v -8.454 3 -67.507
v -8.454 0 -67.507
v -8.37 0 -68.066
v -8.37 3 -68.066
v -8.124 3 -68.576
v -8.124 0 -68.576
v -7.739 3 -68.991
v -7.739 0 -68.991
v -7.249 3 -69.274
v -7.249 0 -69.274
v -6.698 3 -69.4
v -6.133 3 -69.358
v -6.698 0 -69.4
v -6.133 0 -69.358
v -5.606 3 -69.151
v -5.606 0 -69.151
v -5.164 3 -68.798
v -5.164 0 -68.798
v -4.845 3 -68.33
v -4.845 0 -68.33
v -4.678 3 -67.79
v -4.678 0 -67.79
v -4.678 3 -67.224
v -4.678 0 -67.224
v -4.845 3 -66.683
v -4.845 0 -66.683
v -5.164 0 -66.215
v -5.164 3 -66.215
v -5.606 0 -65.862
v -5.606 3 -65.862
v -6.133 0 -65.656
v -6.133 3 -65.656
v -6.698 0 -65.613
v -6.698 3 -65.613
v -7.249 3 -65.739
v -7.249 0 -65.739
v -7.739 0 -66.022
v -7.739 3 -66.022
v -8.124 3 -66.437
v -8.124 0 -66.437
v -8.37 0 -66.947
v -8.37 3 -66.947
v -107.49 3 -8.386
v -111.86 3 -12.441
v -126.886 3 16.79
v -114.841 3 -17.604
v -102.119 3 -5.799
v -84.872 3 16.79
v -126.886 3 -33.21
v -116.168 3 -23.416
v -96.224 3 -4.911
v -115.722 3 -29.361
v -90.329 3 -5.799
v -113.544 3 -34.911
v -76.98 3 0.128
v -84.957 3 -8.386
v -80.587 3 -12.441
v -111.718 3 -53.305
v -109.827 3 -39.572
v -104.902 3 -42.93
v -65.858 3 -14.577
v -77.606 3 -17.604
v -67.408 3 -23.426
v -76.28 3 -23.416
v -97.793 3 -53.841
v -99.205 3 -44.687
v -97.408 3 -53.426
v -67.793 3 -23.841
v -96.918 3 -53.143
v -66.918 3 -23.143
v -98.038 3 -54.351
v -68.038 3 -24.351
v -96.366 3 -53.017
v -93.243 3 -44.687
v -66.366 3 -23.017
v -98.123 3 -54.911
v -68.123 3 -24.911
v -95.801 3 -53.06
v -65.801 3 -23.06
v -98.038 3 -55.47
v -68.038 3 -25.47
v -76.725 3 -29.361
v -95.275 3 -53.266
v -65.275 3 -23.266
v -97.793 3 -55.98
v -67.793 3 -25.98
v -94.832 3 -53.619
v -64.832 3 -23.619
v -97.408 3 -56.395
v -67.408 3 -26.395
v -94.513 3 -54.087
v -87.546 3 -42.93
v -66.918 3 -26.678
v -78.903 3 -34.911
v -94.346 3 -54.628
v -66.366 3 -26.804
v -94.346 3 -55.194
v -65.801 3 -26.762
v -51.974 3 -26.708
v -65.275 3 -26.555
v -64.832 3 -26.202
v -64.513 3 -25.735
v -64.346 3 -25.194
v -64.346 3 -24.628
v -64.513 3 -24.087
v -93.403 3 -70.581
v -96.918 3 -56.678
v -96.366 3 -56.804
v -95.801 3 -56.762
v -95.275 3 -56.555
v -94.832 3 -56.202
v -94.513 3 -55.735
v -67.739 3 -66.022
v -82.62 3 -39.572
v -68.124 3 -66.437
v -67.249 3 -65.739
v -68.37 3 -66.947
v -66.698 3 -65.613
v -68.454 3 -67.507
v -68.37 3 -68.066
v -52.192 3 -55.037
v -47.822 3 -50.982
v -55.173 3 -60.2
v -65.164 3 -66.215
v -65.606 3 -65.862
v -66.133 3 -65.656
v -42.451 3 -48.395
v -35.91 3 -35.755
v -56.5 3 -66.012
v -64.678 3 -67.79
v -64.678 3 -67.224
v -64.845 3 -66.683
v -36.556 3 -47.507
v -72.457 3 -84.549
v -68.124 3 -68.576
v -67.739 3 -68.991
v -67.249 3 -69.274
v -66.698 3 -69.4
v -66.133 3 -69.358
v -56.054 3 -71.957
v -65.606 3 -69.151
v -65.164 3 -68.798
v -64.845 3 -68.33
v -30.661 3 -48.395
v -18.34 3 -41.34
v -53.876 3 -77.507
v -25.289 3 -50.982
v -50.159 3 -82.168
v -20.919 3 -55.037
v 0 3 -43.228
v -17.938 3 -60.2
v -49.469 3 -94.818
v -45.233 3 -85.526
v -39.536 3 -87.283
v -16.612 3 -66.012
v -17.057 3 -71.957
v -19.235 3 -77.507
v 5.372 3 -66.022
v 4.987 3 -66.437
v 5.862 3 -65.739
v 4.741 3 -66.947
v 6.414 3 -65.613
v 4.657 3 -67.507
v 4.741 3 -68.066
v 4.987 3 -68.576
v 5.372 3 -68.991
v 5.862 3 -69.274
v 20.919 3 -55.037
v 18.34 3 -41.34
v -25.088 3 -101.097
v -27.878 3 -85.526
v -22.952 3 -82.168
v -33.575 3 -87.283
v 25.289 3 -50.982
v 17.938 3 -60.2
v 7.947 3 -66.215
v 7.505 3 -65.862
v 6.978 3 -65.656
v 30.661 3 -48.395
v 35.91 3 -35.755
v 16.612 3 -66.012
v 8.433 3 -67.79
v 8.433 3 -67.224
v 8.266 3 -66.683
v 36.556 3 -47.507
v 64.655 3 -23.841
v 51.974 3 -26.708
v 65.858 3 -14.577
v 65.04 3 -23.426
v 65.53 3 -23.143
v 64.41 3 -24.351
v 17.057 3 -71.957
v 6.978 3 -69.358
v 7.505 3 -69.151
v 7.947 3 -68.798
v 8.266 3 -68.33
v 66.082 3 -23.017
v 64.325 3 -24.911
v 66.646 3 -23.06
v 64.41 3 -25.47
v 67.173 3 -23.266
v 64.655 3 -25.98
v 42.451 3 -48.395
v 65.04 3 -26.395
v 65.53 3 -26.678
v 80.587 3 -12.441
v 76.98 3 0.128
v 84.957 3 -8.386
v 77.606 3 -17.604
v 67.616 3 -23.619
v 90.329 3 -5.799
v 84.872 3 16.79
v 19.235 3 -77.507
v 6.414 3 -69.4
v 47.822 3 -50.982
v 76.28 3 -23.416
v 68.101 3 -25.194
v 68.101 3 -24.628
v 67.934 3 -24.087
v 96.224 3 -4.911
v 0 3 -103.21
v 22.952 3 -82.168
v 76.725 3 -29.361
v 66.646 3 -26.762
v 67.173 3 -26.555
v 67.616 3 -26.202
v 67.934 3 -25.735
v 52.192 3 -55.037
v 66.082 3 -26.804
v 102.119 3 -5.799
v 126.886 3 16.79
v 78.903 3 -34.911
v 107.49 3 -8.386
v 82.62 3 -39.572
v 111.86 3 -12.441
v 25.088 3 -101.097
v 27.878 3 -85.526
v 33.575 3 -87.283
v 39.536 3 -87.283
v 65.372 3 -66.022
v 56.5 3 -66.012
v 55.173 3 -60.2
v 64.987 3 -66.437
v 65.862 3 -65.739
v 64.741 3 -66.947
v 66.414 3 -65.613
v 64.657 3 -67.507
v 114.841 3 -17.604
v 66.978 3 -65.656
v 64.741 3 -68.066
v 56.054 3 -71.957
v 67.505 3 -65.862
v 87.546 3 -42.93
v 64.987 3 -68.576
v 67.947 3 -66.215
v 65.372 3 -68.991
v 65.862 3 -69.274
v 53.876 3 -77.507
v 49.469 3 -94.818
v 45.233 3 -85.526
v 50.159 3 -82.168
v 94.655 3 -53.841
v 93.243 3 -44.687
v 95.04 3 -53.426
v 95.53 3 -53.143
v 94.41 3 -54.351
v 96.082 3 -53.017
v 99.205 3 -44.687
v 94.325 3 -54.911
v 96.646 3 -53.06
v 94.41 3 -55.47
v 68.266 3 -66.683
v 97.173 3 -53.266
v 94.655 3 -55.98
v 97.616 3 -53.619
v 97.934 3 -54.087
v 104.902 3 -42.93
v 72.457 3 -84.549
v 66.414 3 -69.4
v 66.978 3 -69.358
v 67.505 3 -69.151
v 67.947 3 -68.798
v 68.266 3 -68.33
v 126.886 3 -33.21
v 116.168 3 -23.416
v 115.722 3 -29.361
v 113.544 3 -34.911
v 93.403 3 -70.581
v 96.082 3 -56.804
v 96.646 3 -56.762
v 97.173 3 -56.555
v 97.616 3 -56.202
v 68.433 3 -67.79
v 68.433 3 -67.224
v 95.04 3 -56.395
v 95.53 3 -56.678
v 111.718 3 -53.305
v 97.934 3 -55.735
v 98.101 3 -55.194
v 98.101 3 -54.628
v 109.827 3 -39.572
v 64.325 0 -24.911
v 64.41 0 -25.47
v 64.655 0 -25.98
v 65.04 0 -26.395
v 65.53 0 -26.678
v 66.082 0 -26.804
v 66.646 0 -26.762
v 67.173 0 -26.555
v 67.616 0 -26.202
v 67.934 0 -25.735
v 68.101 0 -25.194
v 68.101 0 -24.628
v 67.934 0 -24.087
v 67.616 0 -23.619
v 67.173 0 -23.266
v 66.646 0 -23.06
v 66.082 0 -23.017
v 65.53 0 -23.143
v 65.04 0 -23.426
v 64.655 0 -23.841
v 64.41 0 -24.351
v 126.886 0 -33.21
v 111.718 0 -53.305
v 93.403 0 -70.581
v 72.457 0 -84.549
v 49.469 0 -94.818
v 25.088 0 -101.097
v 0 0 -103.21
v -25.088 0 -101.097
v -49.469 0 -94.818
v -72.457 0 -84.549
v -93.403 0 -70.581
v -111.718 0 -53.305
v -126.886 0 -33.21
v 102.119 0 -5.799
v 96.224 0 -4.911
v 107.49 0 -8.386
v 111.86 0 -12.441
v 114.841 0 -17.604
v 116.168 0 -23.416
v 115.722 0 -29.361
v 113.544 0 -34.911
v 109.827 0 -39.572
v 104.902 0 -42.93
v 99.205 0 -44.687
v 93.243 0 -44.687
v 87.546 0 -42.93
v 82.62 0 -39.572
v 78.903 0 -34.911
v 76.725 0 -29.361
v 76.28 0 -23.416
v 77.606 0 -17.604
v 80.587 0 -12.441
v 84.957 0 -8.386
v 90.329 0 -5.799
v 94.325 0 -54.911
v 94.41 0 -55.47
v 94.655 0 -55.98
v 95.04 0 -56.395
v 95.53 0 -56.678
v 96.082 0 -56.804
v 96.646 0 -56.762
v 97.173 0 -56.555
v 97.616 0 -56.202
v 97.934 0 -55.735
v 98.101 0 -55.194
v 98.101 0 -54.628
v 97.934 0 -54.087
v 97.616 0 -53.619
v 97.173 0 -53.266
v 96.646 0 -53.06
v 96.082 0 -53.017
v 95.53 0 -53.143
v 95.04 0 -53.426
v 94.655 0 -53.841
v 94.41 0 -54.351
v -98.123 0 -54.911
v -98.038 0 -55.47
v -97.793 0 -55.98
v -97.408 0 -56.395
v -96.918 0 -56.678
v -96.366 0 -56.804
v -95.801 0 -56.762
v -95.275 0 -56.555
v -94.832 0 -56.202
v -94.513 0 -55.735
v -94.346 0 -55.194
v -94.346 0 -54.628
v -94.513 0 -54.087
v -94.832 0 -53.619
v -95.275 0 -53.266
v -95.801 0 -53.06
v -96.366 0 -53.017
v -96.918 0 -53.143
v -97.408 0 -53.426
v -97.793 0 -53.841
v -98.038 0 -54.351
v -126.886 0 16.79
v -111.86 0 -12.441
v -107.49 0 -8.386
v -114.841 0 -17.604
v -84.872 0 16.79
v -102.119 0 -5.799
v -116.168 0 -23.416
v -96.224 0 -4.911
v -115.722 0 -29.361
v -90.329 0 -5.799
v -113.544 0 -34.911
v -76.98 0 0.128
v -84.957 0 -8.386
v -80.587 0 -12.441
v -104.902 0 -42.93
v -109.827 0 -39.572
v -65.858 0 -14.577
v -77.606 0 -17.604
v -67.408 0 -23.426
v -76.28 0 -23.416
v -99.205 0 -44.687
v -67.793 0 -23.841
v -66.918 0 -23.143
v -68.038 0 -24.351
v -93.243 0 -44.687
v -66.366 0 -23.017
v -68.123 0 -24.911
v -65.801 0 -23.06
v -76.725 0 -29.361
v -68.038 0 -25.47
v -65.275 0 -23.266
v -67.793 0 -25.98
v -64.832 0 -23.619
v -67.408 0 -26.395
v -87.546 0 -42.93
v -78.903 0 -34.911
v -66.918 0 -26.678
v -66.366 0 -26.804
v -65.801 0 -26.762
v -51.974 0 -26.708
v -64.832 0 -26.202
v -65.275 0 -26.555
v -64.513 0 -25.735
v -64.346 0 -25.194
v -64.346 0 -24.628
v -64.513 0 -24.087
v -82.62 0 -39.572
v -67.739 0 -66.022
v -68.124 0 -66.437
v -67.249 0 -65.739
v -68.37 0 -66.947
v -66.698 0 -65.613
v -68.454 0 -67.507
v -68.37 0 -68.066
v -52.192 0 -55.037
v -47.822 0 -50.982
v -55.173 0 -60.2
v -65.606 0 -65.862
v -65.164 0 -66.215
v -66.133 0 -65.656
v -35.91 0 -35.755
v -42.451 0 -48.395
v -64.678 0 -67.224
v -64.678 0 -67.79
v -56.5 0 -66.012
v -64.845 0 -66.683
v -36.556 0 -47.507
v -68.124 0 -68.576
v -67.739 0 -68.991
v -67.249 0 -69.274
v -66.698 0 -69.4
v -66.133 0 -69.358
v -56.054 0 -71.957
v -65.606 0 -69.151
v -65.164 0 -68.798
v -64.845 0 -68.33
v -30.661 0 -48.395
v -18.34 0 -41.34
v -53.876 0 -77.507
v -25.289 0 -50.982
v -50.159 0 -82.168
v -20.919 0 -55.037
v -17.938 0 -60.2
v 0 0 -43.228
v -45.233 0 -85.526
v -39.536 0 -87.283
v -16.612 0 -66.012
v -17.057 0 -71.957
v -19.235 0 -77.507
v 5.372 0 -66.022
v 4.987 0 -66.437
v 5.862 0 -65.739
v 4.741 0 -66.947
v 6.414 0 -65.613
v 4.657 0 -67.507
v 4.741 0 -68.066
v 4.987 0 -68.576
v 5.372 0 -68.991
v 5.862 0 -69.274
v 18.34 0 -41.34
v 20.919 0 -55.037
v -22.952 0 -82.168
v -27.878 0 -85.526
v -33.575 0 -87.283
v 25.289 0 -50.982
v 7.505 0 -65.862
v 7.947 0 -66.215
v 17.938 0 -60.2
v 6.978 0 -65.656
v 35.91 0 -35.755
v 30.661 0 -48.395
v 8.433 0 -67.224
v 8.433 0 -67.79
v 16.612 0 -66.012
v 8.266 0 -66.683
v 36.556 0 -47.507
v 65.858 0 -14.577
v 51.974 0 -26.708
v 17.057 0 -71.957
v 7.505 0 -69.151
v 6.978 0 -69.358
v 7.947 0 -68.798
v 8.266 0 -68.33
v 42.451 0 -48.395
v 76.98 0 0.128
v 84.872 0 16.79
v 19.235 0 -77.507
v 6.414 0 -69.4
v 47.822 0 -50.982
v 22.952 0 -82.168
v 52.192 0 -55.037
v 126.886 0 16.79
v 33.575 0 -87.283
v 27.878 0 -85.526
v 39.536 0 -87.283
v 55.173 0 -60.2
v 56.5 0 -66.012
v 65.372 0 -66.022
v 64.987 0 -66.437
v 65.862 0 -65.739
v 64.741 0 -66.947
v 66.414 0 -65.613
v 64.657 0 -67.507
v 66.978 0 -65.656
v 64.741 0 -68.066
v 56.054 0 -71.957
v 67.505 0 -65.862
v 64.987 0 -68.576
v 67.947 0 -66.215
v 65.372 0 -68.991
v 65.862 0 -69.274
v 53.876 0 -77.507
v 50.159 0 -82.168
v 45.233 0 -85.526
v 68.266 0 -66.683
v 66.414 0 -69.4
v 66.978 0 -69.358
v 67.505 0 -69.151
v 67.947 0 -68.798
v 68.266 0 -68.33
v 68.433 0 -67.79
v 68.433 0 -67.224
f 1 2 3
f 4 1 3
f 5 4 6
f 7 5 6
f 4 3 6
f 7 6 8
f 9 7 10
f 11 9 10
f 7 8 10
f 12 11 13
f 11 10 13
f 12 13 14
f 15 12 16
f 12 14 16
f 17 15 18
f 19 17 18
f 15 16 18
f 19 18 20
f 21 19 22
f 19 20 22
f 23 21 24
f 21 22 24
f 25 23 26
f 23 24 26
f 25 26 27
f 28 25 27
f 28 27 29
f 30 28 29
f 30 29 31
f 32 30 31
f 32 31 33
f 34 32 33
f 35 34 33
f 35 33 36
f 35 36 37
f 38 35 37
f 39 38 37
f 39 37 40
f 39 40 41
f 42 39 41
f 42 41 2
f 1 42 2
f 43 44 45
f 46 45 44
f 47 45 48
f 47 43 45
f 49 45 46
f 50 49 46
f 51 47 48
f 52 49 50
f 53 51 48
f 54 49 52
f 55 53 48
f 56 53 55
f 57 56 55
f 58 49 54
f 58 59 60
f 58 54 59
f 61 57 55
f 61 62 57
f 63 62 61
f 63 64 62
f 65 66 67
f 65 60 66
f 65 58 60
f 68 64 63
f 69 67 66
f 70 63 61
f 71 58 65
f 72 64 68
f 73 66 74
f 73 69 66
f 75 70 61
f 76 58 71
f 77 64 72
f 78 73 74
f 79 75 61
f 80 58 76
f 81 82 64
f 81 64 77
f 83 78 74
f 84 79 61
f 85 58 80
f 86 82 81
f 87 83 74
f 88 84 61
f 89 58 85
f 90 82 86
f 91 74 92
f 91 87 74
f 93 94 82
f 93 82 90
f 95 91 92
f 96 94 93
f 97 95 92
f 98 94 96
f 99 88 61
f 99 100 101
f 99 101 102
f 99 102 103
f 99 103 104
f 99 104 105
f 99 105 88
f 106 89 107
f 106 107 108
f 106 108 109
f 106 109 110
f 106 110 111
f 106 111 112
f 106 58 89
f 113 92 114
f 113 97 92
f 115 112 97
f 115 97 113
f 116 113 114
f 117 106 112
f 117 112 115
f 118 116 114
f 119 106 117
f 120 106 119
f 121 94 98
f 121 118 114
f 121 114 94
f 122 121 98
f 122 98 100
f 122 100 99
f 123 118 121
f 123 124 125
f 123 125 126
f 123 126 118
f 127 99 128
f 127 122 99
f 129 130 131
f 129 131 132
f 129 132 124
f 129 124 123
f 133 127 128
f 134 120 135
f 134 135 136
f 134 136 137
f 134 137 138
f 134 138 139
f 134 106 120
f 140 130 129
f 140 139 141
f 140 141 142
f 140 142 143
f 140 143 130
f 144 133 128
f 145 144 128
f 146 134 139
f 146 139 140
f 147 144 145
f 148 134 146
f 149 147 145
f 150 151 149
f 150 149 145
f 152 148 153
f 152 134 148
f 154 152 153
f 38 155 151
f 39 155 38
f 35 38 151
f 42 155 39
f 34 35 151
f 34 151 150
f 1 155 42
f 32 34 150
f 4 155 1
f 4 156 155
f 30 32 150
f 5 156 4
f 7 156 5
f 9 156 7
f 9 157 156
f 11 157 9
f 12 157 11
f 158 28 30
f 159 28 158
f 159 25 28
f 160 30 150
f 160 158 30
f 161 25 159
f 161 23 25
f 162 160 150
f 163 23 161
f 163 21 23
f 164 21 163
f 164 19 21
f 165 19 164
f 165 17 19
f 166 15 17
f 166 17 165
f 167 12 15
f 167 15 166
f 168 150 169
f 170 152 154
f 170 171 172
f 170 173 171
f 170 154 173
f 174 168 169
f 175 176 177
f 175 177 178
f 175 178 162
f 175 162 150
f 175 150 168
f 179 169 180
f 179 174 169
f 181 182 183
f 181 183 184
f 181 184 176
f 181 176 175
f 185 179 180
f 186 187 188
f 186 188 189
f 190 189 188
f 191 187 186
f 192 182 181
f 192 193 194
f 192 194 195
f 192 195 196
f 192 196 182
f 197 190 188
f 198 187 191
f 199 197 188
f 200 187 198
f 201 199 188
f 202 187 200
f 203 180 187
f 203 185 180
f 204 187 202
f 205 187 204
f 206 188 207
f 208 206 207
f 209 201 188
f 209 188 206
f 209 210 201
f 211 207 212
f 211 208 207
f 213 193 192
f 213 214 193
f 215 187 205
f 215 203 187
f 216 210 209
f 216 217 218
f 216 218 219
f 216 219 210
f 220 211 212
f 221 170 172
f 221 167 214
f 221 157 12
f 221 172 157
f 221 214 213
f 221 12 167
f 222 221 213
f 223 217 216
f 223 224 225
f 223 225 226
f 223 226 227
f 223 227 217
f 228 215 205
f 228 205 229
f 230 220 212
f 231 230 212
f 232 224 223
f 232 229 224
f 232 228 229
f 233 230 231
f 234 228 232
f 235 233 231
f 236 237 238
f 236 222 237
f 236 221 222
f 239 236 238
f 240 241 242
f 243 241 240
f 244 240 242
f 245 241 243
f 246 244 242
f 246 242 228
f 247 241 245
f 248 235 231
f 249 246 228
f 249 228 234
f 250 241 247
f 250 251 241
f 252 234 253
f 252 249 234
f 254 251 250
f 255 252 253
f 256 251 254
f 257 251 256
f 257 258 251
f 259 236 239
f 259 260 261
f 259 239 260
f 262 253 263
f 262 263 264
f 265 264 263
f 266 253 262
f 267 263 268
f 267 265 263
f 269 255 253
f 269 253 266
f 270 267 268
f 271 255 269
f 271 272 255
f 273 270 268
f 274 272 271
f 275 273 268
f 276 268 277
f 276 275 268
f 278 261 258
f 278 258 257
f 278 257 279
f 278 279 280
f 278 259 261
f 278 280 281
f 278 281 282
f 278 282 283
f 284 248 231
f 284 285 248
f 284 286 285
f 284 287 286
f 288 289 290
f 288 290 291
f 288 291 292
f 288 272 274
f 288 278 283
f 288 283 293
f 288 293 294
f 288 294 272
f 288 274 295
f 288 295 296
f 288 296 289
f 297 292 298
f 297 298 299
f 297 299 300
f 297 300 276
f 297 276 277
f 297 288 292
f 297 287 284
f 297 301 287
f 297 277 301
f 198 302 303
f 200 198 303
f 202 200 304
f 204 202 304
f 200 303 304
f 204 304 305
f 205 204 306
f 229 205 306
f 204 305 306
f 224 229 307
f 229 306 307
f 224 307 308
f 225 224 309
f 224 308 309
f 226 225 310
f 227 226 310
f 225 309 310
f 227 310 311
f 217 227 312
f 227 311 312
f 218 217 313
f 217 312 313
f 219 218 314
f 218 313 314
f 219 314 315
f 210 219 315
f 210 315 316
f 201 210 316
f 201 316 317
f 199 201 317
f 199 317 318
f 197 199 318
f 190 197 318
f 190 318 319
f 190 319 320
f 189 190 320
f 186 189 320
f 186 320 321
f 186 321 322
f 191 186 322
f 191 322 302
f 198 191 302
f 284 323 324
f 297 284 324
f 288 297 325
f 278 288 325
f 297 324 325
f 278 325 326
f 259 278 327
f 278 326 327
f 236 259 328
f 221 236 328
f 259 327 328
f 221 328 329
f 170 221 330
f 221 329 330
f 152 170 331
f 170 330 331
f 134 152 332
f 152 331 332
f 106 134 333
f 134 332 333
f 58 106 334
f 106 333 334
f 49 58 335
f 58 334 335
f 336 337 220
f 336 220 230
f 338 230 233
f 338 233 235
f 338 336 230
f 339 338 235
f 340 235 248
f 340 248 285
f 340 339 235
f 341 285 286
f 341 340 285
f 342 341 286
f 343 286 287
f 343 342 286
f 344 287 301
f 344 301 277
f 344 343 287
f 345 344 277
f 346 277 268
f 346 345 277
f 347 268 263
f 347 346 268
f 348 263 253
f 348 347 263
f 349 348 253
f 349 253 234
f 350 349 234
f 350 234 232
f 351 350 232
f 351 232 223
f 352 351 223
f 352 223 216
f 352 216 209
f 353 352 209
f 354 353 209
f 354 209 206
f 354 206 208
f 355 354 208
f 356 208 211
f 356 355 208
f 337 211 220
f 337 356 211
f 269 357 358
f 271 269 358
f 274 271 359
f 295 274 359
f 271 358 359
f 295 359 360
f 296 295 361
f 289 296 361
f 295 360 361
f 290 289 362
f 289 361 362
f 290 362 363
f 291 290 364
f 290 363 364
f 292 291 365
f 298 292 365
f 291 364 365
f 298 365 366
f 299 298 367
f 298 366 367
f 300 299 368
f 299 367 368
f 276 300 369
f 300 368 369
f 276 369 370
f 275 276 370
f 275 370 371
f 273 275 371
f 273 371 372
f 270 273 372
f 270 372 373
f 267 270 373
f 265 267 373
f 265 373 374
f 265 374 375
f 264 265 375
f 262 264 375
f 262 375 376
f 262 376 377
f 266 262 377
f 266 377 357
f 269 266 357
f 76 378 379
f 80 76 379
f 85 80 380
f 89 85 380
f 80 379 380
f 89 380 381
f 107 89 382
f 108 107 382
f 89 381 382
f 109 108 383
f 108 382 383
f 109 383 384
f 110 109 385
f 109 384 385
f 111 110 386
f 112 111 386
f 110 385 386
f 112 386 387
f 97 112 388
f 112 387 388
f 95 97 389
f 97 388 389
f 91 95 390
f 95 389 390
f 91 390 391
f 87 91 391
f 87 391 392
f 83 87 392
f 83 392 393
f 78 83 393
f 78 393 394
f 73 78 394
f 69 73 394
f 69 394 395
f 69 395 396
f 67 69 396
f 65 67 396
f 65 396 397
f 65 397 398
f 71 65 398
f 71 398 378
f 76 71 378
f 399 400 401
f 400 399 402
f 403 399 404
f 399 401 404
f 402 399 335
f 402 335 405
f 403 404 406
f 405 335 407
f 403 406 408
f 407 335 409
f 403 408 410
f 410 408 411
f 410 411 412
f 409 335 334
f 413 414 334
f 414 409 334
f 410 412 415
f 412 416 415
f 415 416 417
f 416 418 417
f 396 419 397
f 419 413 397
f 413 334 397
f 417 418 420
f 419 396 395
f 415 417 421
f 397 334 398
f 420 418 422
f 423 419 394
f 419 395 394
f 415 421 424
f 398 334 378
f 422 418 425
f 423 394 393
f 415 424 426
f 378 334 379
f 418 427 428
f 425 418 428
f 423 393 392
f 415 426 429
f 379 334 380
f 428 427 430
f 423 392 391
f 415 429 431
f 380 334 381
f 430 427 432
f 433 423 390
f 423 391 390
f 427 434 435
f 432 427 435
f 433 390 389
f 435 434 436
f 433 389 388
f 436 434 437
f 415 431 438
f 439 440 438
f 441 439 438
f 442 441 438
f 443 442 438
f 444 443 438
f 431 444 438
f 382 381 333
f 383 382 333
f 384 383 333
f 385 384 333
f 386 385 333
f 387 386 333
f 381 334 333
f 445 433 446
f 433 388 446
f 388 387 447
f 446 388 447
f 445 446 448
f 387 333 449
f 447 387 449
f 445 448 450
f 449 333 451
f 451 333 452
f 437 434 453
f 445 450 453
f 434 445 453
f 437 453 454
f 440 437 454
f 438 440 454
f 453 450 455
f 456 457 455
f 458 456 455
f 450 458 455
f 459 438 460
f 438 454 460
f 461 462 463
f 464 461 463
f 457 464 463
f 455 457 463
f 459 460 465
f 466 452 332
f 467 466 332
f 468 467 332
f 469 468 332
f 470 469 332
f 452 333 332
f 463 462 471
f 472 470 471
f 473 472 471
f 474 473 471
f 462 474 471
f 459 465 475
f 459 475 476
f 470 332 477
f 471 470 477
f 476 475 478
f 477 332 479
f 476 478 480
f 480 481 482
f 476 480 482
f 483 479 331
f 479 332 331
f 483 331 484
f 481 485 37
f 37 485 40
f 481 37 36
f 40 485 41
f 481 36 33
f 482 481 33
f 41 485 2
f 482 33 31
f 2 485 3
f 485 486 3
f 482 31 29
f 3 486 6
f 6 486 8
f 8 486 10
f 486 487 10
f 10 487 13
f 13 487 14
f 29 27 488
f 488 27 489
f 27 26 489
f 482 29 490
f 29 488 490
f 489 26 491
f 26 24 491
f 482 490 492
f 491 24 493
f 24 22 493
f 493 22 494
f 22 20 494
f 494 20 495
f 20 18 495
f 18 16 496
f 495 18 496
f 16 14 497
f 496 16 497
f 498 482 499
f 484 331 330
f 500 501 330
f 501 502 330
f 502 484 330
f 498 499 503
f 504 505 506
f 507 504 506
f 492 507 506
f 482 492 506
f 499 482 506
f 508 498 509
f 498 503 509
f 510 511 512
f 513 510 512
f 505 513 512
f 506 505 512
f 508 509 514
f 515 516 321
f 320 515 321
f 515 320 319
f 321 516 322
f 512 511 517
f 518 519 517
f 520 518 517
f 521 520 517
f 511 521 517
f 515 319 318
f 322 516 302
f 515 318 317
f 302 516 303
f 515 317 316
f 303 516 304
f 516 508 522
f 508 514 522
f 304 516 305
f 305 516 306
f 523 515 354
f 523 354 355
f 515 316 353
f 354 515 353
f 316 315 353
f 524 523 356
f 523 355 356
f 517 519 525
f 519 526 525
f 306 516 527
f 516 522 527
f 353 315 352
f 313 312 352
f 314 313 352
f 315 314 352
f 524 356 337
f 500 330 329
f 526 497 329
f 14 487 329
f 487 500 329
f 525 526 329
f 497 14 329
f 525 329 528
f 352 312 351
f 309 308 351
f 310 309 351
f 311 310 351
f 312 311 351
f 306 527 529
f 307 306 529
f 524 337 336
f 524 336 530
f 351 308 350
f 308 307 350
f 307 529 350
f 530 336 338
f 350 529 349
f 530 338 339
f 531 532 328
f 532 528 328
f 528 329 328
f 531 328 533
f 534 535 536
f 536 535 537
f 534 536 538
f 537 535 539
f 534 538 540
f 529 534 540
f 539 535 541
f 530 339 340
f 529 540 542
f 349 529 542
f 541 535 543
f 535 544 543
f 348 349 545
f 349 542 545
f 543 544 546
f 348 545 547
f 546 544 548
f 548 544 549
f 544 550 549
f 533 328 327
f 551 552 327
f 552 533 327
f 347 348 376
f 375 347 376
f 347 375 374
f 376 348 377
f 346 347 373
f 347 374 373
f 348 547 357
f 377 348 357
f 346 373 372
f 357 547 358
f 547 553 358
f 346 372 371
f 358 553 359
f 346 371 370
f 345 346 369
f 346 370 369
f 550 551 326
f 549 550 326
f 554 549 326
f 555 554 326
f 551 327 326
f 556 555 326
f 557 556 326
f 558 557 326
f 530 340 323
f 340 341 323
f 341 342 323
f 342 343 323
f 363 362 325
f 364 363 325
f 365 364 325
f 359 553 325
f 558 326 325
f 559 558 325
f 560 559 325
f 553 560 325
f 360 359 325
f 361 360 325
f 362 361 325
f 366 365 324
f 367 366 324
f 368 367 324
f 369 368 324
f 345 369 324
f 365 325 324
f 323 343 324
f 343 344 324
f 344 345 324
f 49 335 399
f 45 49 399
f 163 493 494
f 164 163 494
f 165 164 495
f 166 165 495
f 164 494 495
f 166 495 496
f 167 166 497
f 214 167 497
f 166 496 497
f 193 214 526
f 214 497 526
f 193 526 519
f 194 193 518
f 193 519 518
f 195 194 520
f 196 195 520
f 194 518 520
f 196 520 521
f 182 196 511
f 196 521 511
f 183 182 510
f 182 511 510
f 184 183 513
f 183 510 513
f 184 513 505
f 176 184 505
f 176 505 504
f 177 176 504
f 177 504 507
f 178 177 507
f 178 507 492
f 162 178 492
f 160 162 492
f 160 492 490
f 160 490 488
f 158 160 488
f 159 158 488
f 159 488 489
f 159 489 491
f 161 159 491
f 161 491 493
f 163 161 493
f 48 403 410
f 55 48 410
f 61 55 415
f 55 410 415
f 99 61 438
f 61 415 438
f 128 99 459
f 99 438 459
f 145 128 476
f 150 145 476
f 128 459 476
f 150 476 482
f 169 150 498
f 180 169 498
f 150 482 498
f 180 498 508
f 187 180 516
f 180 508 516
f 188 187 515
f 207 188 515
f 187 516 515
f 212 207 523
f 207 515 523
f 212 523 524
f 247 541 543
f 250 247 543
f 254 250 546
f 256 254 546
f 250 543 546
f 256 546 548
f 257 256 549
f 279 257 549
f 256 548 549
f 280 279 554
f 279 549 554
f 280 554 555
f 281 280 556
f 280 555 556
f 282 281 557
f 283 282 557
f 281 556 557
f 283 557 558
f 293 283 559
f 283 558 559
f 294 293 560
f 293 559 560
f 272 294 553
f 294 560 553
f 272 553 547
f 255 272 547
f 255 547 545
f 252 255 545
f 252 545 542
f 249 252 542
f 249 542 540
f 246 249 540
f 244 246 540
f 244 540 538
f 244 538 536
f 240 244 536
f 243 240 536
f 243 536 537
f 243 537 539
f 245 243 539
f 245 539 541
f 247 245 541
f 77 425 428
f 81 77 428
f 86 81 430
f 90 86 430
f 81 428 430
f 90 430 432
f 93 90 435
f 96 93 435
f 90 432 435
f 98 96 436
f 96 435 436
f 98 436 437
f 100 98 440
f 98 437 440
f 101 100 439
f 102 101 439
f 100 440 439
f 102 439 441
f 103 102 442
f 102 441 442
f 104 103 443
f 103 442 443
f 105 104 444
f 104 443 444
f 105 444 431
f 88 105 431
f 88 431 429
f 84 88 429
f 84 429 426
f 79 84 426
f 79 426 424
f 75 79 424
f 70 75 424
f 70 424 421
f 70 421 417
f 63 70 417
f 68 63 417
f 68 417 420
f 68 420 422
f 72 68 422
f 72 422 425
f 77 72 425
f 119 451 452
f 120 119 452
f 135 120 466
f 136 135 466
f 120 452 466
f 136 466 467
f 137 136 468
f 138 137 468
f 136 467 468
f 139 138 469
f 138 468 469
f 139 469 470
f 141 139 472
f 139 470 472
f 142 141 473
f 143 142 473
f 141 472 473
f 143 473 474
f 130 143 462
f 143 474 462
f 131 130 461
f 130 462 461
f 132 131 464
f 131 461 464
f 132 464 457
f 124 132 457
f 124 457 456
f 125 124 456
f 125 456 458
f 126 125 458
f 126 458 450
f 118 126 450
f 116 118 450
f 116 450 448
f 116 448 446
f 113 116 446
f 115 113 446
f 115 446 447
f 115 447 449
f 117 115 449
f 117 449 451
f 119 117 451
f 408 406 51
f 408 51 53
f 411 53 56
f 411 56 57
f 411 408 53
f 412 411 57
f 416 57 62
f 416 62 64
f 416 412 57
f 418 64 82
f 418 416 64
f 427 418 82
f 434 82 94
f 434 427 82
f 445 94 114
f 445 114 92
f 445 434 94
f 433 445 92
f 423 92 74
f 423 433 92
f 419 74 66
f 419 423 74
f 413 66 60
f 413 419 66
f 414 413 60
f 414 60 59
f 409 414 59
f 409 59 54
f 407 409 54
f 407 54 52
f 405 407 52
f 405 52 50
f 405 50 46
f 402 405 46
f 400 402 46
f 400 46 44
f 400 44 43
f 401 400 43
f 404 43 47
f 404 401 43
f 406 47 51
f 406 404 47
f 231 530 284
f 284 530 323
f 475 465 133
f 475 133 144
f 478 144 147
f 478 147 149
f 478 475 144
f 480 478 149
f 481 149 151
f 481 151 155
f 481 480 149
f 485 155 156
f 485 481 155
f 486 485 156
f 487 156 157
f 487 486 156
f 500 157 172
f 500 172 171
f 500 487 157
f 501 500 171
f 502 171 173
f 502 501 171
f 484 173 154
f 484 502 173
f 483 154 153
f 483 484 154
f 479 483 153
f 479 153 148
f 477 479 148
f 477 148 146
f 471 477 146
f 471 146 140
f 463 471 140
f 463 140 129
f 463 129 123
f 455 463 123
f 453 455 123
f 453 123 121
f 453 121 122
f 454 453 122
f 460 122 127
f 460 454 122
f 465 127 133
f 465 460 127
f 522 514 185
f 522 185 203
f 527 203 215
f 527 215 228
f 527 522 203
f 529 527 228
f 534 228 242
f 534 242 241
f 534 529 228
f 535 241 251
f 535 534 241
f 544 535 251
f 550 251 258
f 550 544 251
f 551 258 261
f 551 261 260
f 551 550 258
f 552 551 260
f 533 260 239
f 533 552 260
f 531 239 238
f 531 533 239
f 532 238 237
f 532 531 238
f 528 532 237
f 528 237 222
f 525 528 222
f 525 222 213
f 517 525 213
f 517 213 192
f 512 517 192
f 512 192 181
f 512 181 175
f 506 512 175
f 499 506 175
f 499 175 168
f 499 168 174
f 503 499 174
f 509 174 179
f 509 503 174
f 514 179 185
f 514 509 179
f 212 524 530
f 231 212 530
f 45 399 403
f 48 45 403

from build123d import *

# Parameters (mm, degrees)
SKETCH3_R              = 20
BOSS_EXTRUDE3_DEPTH    = 3
F_10_24_TAPPED_HOLE1_D = 3.7973


with BuildPart() as part:
    # Sketch3 → Boss-Extrude3 (new body)
    with BuildSketch(Plane(origin=(0, 0, 0), x_dir=(1, 0, 0), z_dir=(0, 1, 0))):
        with BuildLine():
            Line((-126.885775404, -16.789832489), (-84.87168845, -16.789832489))
            ThreePointArc((-84.87168845, -16.789832489), (0, 43.227962976), (84.87168845, -16.789832489))
            Line((84.87168845, -16.789832489), (126.885775404, -16.789832489))
            Line((126.885775404, -16.789832489), (126.885775404, 33.210167511))
            ThreePointArc((126.885775404, 33.210167511), (0, 103.210167511), (-126.885775404, 33.210167511))
            Line((-126.885775404, 33.210167511), (-126.885775404, -16.789832489))
        make_face()
        with Locations(Location((-36.555626875, 67.506651026, 0), (0, 0, 270))):
            Circle(SKETCH3_R, mode=Mode.SUBTRACT)
        with Locations(Location((-96.223855306, 24.910723088, 0), (0, 0, 270))):
            Circle(SKETCH3_R, mode=Mode.SUBTRACT)
        with Locations(Location((36.555626875, 67.506651026, 0), (0, 0, 270))):
            Circle(SKETCH3_R, mode=Mode.SUBTRACT)
        with Locations(Location((96.223855306, 24.910723088, 0), (0, 0, 270))):
            Circle(SKETCH3_R, mode=Mode.SUBTRACT)
    extrude(amount=BOSS_EXTRUDE3_DEPTH)

    # #10-24 Tapped Hole1 (through all)
    with Locations(Plane(origin=(0, 3, 0), x_dir=(1, 0, 0), z_dir=(0, 1, 0))):
        with Locations((-66.223855306, 24.910723088), (-96.223855306, 54.910723088), (-66.555626875, 67.506651026), (-6.555626875, 67.506651026), (6.555626875, 67.506651026), (66.555626875, 67.506651026), (96.223855306, 54.910723088), (66.223855306, 24.910723088)):
            Hole(F_10_24_TAPPED_HOLE1_D / 2)


solid = part.part
